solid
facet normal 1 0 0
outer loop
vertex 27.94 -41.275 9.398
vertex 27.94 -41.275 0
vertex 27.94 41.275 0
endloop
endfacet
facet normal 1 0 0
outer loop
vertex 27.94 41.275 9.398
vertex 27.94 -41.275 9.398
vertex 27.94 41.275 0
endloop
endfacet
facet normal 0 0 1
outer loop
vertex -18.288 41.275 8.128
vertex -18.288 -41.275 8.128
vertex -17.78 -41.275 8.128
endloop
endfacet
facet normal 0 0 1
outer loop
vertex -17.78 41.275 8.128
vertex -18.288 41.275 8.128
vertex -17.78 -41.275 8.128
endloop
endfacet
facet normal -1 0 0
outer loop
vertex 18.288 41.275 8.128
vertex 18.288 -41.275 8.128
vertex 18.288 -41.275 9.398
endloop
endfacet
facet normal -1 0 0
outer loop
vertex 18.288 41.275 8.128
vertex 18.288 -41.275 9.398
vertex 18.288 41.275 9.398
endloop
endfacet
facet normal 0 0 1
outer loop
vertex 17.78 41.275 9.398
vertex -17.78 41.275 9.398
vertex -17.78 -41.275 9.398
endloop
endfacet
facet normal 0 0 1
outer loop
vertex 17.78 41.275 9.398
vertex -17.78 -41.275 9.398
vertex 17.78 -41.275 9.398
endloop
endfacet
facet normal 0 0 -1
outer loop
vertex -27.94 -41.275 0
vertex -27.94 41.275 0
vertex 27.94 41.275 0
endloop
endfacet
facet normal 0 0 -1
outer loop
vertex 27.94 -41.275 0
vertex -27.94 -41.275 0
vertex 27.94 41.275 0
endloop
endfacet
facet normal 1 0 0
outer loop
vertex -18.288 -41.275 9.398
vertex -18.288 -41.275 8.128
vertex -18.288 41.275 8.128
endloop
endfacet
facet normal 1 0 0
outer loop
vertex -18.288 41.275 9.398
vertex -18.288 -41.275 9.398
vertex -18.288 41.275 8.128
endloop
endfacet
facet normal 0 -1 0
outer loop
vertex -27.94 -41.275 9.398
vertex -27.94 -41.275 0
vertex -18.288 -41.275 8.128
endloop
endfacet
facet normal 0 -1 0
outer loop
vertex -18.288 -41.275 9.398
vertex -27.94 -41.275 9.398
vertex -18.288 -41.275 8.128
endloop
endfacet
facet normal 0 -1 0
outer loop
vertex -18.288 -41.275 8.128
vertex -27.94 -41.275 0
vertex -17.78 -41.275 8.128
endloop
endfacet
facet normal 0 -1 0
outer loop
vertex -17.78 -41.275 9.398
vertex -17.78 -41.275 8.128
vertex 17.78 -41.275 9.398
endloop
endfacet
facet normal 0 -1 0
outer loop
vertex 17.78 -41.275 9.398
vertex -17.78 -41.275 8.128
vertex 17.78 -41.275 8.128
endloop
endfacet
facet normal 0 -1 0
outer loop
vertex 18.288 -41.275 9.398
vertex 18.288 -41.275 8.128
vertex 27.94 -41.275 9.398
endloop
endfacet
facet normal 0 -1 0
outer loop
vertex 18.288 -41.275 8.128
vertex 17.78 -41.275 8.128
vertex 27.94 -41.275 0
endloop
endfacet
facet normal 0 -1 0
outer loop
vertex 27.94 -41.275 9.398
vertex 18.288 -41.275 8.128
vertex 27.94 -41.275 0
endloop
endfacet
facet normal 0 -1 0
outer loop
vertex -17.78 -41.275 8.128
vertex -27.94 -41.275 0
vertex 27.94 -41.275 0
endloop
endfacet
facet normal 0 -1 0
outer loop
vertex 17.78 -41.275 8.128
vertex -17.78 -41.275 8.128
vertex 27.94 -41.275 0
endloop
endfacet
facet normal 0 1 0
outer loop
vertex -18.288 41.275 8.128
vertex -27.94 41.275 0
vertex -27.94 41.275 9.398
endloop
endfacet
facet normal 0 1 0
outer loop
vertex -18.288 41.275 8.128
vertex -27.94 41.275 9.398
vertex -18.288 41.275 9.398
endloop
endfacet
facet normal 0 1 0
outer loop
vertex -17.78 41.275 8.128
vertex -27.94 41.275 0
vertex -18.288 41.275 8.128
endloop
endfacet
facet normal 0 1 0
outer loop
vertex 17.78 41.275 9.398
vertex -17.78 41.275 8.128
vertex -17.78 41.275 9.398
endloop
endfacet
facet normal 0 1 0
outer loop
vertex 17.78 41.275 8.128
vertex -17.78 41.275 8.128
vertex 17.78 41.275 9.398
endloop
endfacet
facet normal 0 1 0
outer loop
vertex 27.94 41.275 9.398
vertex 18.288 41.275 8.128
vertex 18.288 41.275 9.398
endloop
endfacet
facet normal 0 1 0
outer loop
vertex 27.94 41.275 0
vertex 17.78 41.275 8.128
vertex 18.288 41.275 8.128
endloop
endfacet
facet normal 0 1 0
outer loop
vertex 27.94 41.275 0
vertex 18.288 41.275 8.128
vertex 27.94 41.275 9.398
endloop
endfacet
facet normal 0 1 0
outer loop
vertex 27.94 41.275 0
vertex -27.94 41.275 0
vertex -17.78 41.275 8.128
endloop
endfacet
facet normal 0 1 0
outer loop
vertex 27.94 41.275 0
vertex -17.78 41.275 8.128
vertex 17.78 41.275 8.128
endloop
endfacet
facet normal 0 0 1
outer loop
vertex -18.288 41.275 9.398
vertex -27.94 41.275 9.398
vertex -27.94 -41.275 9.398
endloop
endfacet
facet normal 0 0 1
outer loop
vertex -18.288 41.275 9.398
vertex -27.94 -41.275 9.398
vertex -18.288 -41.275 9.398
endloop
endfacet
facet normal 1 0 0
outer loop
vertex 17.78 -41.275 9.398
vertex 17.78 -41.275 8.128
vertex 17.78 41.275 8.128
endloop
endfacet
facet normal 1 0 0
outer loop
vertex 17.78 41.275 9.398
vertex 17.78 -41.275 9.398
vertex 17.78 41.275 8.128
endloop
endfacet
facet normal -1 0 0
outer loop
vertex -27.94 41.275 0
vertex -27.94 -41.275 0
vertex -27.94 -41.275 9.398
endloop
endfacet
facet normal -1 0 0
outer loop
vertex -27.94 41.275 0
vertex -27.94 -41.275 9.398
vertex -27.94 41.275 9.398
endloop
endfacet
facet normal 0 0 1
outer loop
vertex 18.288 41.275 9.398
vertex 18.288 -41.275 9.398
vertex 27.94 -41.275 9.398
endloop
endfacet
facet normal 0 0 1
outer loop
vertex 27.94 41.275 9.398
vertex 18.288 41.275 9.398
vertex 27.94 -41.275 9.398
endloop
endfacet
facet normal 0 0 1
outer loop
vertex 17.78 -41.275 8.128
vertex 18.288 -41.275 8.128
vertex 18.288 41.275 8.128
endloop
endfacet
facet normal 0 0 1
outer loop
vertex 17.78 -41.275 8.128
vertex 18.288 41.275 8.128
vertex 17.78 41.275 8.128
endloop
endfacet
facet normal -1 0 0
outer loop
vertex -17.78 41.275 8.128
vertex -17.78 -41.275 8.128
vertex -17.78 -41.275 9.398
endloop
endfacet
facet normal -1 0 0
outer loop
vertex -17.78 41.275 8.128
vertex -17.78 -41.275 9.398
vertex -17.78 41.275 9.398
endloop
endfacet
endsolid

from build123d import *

# Parameters (mm, degrees)
SKETCH1_W               = 55.88
SKETCH1_H               = 82.55
BOSS_EXTRUDE1_DEPTH     = 9.398
CUT_EXTRUDE_THIN1_START = -1.27
SKETCH2_W               = 0.508
SKETCH2_H               = 82.55
CUT_EXTRUDE_THIN1_DEPTH = 52.99072189


with BuildPart() as part:
    # Sketch1 → Boss-Extrude1 (new body)
    with BuildSketch(Plane.XY):
        Rectangle(SKETCH1_W, SKETCH1_H)
    extrude(amount=BOSS_EXTRUDE1_DEPTH)

    # Sketch2 → Cut-Extrude-Thin1 (cut)
    with BuildSketch(Plane.XY.offset(9.398).offset(CUT_EXTRUDE_THIN1_START)):
        with Locations((-18.034, 0)):
            Rectangle(SKETCH2_W, SKETCH2_H)
    cut_extrude_thin1 = extrude(amount=CUT_EXTRUDE_THIN1_DEPTH, mode=Mode.SUBTRACT)

    # Mirror1: Cut-Extrude-Thin1 across plane
    add(cut_extrude_thin1.mirror(Plane(origin=(0, 0, 0), x_dir=(0, 0, 1), z_dir=(1, 0, 0))), mode=Mode.SUBTRACT)


solid = part.part
